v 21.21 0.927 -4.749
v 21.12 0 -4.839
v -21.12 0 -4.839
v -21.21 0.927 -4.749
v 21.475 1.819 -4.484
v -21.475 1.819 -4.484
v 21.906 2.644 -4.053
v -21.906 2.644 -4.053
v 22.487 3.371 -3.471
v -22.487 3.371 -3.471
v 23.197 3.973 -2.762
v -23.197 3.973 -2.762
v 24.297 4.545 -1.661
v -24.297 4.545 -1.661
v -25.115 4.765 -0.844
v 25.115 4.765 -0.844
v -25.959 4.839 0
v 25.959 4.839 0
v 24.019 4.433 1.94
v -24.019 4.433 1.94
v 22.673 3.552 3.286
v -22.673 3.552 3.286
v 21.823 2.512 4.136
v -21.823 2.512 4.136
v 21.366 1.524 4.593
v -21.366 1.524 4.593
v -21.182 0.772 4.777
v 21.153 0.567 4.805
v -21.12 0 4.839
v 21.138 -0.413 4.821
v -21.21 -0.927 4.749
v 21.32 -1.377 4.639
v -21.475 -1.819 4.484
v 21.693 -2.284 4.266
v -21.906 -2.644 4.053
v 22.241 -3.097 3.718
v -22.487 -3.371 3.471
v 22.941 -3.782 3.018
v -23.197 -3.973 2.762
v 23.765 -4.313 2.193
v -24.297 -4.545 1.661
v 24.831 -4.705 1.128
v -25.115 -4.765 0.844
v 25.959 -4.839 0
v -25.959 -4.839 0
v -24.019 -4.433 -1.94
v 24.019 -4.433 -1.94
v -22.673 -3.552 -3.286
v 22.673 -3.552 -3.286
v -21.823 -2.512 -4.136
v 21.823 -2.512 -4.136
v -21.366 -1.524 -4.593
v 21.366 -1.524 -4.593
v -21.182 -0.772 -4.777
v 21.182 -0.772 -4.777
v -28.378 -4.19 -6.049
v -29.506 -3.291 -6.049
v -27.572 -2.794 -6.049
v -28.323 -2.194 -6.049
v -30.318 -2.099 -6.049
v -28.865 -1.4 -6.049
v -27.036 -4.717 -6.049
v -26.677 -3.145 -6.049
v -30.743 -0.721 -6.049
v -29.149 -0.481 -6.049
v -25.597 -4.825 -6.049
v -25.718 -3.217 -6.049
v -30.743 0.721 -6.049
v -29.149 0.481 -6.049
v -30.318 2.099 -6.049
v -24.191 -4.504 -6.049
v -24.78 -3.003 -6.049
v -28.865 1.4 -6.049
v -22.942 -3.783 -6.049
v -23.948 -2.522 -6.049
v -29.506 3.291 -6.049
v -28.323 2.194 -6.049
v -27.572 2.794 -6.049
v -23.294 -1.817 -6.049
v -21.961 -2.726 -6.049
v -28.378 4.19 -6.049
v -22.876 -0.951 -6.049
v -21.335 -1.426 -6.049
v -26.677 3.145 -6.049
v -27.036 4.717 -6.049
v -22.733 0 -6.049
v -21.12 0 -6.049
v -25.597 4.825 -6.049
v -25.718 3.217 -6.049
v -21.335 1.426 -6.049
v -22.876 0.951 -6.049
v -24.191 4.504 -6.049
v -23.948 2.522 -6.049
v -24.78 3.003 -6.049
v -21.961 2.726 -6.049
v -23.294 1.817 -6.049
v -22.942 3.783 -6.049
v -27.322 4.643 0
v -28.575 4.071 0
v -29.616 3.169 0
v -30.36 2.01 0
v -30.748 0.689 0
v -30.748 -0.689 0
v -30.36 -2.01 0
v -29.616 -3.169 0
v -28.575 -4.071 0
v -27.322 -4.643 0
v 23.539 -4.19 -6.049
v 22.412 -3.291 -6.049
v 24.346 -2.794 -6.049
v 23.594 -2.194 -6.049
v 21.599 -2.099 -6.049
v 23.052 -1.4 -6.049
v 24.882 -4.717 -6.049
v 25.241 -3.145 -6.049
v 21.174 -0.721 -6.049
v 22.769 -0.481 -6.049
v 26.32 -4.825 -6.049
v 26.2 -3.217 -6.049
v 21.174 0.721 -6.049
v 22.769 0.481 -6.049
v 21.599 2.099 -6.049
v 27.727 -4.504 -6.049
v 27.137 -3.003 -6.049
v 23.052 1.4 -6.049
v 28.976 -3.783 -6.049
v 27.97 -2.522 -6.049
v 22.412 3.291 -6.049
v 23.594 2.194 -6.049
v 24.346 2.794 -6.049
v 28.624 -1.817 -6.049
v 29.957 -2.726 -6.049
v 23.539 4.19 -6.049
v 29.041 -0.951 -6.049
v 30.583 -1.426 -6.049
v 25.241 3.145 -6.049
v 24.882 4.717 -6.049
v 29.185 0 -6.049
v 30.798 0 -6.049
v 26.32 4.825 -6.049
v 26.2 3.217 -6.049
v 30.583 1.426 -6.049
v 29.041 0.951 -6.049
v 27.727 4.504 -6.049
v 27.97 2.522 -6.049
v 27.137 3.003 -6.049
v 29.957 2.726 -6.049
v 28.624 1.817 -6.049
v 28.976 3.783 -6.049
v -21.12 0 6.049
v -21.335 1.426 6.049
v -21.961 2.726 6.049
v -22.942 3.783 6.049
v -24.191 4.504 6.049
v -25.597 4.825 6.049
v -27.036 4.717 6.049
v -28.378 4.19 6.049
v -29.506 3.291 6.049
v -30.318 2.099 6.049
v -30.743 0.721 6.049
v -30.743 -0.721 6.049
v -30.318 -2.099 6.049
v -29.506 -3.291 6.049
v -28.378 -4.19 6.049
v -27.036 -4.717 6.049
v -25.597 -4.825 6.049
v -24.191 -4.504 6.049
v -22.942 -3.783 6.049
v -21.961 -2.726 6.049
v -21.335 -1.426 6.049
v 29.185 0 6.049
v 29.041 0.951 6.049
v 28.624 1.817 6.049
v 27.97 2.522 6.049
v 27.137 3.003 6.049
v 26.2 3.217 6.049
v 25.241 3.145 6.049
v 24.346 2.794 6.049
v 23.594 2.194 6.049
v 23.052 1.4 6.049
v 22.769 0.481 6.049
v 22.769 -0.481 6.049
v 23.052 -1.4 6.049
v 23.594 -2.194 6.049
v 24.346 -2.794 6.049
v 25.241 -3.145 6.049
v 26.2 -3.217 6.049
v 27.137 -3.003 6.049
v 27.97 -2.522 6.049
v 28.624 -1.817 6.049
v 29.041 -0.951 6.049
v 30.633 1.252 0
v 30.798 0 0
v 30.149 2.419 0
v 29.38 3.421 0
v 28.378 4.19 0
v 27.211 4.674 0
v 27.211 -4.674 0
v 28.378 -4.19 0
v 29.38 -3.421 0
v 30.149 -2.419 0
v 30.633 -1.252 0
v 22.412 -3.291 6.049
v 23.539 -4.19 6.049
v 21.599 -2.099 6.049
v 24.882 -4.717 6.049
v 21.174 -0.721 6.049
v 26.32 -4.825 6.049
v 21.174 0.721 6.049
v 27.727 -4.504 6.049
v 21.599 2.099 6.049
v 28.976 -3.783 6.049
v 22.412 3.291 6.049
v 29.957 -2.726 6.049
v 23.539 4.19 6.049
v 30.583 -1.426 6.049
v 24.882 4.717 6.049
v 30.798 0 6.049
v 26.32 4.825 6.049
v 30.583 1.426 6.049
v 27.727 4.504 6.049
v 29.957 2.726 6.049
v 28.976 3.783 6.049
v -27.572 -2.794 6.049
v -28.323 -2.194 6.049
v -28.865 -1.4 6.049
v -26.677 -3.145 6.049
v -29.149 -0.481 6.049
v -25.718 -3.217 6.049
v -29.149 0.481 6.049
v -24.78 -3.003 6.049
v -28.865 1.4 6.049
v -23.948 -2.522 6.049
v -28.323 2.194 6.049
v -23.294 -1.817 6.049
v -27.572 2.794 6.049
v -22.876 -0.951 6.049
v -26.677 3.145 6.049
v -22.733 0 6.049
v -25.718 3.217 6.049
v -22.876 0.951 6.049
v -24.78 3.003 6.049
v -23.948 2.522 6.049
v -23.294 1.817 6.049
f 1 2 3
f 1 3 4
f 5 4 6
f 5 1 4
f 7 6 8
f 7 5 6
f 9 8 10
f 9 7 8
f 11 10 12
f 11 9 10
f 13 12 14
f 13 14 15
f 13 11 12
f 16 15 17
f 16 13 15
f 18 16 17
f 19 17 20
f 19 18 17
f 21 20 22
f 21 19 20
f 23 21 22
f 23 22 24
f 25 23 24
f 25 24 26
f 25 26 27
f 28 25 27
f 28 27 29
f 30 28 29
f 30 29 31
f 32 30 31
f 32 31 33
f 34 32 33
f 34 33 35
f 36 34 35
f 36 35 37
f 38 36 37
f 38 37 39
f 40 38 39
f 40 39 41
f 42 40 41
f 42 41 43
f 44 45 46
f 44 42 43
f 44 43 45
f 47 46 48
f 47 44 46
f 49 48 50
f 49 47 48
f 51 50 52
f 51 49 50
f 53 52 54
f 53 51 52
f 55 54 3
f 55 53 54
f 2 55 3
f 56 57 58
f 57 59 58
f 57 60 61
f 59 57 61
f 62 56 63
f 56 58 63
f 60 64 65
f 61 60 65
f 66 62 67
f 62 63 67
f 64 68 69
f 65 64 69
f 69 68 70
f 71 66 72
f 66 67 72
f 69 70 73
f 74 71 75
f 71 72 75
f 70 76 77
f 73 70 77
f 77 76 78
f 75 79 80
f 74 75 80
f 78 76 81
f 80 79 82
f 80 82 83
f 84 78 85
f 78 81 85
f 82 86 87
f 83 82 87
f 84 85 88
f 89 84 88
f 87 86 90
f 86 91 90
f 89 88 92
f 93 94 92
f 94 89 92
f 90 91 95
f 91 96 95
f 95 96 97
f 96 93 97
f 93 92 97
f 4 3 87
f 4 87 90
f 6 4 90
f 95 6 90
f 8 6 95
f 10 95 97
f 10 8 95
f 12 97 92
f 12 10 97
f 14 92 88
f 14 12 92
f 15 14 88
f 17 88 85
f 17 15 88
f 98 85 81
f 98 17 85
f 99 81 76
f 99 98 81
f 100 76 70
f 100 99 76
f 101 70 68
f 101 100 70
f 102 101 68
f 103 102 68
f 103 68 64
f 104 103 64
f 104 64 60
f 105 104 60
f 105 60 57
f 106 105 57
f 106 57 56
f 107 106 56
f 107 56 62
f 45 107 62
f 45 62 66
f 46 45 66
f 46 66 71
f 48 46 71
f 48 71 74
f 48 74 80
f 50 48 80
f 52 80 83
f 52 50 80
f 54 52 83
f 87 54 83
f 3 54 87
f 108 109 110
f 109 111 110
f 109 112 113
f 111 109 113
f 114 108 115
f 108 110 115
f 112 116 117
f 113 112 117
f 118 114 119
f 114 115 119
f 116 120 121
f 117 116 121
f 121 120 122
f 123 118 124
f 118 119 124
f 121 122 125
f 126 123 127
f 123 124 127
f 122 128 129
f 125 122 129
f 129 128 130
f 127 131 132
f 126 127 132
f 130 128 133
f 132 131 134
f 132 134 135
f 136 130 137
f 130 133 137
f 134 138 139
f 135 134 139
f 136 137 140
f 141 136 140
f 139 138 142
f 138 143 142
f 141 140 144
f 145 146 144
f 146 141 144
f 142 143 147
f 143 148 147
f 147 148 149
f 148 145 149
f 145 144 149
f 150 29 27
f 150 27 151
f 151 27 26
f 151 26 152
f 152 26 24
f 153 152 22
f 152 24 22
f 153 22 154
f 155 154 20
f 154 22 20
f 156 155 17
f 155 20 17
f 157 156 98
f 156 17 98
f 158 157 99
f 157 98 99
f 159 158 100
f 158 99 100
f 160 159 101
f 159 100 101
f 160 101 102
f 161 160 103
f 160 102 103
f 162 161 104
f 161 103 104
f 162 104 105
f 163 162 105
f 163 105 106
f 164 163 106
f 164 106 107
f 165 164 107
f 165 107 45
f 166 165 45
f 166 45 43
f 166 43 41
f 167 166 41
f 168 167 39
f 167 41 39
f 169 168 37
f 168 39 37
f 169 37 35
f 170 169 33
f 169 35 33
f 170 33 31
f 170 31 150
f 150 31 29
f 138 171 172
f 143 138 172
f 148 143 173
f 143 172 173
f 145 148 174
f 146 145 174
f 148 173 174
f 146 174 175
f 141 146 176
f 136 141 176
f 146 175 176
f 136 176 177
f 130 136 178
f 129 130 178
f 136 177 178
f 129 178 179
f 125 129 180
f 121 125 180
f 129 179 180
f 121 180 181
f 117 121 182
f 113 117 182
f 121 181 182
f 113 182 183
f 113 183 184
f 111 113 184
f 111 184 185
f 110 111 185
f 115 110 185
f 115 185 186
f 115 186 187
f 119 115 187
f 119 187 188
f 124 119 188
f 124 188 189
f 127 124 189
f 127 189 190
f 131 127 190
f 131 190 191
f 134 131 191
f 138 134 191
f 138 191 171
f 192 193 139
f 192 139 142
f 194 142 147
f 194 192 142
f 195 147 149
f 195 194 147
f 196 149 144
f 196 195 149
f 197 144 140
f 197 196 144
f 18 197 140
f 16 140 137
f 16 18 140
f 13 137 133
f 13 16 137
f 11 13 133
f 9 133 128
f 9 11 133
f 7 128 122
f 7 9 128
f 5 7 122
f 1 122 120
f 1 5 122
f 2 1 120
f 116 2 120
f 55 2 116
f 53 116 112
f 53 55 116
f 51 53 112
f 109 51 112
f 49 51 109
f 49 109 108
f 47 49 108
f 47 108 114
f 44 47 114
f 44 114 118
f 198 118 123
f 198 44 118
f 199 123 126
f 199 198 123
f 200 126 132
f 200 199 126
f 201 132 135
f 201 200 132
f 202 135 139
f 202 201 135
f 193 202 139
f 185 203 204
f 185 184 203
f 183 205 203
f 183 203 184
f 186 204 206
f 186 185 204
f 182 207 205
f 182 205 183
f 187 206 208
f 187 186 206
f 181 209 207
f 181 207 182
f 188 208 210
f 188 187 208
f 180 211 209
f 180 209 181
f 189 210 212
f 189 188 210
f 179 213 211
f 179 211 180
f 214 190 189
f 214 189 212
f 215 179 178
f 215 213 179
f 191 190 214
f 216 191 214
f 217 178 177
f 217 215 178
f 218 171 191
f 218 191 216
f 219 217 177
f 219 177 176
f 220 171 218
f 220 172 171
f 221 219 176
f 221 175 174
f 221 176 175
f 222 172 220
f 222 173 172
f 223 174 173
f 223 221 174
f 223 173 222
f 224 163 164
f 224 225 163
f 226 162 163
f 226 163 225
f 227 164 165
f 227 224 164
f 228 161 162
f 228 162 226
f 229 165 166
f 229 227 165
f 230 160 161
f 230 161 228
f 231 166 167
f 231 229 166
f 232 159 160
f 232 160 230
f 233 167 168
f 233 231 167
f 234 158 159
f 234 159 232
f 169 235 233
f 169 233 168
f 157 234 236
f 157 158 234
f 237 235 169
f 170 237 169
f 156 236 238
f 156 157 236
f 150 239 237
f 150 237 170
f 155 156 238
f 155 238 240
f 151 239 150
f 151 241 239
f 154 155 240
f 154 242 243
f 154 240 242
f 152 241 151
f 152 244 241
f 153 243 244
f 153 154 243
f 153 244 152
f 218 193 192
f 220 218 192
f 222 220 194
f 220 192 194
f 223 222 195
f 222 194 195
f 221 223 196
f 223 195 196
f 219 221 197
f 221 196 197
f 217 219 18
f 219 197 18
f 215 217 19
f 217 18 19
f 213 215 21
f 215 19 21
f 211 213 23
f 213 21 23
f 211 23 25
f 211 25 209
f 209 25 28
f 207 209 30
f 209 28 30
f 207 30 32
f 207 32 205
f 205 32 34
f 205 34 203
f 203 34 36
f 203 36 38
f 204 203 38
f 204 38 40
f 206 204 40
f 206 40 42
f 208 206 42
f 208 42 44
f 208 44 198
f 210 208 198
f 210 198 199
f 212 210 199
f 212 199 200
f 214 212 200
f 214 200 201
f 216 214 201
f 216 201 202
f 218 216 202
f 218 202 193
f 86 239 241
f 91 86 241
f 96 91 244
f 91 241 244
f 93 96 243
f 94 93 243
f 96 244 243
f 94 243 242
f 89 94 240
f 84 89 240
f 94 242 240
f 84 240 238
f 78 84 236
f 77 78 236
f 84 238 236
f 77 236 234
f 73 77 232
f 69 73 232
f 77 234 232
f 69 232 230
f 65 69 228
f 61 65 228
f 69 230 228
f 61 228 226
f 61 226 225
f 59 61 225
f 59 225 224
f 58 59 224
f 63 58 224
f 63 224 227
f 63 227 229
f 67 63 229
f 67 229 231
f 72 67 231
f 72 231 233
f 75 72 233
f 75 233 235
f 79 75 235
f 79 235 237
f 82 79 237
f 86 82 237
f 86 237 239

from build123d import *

# Parameters (mm, degrees)
BOSS_EXTRUDE1_DEPTH      = 25.9588
BOSS_EXTRUDE1_DEPTH_BACK = 25.9588
SKETCH1_R                = 4.8387
BOSS_EXTRUDE2_DEPTH      = 6.04901
BOSS_EXTRUDE2_DEPTH_BACK = 6.04901
SKETCH2_R                = 4.8387
SKETCH3_R                = 3.2258
CUT_EXTRUDE1_DEPTH       = 34.440411359


with BuildPart() as part:
    # Sketch1 → Boss-Extrude1 (new, two sides: drawn at the far end of the back side and taken through both)
    with BuildSketch(Plane(origin=(0, 0, 0), x_dir=(0, 0, -1), z_dir=(1, 0, 0)).offset(-BOSS_EXTRUDE1_DEPTH_BACK)):
        Circle(SKETCH1_R)
    extrude(amount=BOSS_EXTRUDE1_DEPTH + BOSS_EXTRUDE1_DEPTH_BACK)

    # Sketch2 → Boss-Extrude2 (add, two sides: drawn at the far end of the back side and taken through both)
    with BuildSketch(Plane.XY.offset(-BOSS_EXTRUDE2_DEPTH_BACK)):
        with Locations((25.9588, 0)):
            Circle(SKETCH2_R)
        with Locations((-25.9588, 0)):
            Circle(SKETCH2_R)
    extrude(amount=BOSS_EXTRUDE2_DEPTH + BOSS_EXTRUDE2_DEPTH_BACK)

    # Sketch3 → Cut-Extrude1 (cut, through all)
    with BuildSketch(Plane.XY.offset(6.04901)):
        with Locations((-25.9588, 0)):
            Circle(SKETCH3_R)
        with Locations((25.9588, 0)):
            Circle(SKETCH3_R)
    extrude(amount=-CUT_EXTRUDE1_DEPTH, mode=Mode.SUBTRACT)


solid = part.part
